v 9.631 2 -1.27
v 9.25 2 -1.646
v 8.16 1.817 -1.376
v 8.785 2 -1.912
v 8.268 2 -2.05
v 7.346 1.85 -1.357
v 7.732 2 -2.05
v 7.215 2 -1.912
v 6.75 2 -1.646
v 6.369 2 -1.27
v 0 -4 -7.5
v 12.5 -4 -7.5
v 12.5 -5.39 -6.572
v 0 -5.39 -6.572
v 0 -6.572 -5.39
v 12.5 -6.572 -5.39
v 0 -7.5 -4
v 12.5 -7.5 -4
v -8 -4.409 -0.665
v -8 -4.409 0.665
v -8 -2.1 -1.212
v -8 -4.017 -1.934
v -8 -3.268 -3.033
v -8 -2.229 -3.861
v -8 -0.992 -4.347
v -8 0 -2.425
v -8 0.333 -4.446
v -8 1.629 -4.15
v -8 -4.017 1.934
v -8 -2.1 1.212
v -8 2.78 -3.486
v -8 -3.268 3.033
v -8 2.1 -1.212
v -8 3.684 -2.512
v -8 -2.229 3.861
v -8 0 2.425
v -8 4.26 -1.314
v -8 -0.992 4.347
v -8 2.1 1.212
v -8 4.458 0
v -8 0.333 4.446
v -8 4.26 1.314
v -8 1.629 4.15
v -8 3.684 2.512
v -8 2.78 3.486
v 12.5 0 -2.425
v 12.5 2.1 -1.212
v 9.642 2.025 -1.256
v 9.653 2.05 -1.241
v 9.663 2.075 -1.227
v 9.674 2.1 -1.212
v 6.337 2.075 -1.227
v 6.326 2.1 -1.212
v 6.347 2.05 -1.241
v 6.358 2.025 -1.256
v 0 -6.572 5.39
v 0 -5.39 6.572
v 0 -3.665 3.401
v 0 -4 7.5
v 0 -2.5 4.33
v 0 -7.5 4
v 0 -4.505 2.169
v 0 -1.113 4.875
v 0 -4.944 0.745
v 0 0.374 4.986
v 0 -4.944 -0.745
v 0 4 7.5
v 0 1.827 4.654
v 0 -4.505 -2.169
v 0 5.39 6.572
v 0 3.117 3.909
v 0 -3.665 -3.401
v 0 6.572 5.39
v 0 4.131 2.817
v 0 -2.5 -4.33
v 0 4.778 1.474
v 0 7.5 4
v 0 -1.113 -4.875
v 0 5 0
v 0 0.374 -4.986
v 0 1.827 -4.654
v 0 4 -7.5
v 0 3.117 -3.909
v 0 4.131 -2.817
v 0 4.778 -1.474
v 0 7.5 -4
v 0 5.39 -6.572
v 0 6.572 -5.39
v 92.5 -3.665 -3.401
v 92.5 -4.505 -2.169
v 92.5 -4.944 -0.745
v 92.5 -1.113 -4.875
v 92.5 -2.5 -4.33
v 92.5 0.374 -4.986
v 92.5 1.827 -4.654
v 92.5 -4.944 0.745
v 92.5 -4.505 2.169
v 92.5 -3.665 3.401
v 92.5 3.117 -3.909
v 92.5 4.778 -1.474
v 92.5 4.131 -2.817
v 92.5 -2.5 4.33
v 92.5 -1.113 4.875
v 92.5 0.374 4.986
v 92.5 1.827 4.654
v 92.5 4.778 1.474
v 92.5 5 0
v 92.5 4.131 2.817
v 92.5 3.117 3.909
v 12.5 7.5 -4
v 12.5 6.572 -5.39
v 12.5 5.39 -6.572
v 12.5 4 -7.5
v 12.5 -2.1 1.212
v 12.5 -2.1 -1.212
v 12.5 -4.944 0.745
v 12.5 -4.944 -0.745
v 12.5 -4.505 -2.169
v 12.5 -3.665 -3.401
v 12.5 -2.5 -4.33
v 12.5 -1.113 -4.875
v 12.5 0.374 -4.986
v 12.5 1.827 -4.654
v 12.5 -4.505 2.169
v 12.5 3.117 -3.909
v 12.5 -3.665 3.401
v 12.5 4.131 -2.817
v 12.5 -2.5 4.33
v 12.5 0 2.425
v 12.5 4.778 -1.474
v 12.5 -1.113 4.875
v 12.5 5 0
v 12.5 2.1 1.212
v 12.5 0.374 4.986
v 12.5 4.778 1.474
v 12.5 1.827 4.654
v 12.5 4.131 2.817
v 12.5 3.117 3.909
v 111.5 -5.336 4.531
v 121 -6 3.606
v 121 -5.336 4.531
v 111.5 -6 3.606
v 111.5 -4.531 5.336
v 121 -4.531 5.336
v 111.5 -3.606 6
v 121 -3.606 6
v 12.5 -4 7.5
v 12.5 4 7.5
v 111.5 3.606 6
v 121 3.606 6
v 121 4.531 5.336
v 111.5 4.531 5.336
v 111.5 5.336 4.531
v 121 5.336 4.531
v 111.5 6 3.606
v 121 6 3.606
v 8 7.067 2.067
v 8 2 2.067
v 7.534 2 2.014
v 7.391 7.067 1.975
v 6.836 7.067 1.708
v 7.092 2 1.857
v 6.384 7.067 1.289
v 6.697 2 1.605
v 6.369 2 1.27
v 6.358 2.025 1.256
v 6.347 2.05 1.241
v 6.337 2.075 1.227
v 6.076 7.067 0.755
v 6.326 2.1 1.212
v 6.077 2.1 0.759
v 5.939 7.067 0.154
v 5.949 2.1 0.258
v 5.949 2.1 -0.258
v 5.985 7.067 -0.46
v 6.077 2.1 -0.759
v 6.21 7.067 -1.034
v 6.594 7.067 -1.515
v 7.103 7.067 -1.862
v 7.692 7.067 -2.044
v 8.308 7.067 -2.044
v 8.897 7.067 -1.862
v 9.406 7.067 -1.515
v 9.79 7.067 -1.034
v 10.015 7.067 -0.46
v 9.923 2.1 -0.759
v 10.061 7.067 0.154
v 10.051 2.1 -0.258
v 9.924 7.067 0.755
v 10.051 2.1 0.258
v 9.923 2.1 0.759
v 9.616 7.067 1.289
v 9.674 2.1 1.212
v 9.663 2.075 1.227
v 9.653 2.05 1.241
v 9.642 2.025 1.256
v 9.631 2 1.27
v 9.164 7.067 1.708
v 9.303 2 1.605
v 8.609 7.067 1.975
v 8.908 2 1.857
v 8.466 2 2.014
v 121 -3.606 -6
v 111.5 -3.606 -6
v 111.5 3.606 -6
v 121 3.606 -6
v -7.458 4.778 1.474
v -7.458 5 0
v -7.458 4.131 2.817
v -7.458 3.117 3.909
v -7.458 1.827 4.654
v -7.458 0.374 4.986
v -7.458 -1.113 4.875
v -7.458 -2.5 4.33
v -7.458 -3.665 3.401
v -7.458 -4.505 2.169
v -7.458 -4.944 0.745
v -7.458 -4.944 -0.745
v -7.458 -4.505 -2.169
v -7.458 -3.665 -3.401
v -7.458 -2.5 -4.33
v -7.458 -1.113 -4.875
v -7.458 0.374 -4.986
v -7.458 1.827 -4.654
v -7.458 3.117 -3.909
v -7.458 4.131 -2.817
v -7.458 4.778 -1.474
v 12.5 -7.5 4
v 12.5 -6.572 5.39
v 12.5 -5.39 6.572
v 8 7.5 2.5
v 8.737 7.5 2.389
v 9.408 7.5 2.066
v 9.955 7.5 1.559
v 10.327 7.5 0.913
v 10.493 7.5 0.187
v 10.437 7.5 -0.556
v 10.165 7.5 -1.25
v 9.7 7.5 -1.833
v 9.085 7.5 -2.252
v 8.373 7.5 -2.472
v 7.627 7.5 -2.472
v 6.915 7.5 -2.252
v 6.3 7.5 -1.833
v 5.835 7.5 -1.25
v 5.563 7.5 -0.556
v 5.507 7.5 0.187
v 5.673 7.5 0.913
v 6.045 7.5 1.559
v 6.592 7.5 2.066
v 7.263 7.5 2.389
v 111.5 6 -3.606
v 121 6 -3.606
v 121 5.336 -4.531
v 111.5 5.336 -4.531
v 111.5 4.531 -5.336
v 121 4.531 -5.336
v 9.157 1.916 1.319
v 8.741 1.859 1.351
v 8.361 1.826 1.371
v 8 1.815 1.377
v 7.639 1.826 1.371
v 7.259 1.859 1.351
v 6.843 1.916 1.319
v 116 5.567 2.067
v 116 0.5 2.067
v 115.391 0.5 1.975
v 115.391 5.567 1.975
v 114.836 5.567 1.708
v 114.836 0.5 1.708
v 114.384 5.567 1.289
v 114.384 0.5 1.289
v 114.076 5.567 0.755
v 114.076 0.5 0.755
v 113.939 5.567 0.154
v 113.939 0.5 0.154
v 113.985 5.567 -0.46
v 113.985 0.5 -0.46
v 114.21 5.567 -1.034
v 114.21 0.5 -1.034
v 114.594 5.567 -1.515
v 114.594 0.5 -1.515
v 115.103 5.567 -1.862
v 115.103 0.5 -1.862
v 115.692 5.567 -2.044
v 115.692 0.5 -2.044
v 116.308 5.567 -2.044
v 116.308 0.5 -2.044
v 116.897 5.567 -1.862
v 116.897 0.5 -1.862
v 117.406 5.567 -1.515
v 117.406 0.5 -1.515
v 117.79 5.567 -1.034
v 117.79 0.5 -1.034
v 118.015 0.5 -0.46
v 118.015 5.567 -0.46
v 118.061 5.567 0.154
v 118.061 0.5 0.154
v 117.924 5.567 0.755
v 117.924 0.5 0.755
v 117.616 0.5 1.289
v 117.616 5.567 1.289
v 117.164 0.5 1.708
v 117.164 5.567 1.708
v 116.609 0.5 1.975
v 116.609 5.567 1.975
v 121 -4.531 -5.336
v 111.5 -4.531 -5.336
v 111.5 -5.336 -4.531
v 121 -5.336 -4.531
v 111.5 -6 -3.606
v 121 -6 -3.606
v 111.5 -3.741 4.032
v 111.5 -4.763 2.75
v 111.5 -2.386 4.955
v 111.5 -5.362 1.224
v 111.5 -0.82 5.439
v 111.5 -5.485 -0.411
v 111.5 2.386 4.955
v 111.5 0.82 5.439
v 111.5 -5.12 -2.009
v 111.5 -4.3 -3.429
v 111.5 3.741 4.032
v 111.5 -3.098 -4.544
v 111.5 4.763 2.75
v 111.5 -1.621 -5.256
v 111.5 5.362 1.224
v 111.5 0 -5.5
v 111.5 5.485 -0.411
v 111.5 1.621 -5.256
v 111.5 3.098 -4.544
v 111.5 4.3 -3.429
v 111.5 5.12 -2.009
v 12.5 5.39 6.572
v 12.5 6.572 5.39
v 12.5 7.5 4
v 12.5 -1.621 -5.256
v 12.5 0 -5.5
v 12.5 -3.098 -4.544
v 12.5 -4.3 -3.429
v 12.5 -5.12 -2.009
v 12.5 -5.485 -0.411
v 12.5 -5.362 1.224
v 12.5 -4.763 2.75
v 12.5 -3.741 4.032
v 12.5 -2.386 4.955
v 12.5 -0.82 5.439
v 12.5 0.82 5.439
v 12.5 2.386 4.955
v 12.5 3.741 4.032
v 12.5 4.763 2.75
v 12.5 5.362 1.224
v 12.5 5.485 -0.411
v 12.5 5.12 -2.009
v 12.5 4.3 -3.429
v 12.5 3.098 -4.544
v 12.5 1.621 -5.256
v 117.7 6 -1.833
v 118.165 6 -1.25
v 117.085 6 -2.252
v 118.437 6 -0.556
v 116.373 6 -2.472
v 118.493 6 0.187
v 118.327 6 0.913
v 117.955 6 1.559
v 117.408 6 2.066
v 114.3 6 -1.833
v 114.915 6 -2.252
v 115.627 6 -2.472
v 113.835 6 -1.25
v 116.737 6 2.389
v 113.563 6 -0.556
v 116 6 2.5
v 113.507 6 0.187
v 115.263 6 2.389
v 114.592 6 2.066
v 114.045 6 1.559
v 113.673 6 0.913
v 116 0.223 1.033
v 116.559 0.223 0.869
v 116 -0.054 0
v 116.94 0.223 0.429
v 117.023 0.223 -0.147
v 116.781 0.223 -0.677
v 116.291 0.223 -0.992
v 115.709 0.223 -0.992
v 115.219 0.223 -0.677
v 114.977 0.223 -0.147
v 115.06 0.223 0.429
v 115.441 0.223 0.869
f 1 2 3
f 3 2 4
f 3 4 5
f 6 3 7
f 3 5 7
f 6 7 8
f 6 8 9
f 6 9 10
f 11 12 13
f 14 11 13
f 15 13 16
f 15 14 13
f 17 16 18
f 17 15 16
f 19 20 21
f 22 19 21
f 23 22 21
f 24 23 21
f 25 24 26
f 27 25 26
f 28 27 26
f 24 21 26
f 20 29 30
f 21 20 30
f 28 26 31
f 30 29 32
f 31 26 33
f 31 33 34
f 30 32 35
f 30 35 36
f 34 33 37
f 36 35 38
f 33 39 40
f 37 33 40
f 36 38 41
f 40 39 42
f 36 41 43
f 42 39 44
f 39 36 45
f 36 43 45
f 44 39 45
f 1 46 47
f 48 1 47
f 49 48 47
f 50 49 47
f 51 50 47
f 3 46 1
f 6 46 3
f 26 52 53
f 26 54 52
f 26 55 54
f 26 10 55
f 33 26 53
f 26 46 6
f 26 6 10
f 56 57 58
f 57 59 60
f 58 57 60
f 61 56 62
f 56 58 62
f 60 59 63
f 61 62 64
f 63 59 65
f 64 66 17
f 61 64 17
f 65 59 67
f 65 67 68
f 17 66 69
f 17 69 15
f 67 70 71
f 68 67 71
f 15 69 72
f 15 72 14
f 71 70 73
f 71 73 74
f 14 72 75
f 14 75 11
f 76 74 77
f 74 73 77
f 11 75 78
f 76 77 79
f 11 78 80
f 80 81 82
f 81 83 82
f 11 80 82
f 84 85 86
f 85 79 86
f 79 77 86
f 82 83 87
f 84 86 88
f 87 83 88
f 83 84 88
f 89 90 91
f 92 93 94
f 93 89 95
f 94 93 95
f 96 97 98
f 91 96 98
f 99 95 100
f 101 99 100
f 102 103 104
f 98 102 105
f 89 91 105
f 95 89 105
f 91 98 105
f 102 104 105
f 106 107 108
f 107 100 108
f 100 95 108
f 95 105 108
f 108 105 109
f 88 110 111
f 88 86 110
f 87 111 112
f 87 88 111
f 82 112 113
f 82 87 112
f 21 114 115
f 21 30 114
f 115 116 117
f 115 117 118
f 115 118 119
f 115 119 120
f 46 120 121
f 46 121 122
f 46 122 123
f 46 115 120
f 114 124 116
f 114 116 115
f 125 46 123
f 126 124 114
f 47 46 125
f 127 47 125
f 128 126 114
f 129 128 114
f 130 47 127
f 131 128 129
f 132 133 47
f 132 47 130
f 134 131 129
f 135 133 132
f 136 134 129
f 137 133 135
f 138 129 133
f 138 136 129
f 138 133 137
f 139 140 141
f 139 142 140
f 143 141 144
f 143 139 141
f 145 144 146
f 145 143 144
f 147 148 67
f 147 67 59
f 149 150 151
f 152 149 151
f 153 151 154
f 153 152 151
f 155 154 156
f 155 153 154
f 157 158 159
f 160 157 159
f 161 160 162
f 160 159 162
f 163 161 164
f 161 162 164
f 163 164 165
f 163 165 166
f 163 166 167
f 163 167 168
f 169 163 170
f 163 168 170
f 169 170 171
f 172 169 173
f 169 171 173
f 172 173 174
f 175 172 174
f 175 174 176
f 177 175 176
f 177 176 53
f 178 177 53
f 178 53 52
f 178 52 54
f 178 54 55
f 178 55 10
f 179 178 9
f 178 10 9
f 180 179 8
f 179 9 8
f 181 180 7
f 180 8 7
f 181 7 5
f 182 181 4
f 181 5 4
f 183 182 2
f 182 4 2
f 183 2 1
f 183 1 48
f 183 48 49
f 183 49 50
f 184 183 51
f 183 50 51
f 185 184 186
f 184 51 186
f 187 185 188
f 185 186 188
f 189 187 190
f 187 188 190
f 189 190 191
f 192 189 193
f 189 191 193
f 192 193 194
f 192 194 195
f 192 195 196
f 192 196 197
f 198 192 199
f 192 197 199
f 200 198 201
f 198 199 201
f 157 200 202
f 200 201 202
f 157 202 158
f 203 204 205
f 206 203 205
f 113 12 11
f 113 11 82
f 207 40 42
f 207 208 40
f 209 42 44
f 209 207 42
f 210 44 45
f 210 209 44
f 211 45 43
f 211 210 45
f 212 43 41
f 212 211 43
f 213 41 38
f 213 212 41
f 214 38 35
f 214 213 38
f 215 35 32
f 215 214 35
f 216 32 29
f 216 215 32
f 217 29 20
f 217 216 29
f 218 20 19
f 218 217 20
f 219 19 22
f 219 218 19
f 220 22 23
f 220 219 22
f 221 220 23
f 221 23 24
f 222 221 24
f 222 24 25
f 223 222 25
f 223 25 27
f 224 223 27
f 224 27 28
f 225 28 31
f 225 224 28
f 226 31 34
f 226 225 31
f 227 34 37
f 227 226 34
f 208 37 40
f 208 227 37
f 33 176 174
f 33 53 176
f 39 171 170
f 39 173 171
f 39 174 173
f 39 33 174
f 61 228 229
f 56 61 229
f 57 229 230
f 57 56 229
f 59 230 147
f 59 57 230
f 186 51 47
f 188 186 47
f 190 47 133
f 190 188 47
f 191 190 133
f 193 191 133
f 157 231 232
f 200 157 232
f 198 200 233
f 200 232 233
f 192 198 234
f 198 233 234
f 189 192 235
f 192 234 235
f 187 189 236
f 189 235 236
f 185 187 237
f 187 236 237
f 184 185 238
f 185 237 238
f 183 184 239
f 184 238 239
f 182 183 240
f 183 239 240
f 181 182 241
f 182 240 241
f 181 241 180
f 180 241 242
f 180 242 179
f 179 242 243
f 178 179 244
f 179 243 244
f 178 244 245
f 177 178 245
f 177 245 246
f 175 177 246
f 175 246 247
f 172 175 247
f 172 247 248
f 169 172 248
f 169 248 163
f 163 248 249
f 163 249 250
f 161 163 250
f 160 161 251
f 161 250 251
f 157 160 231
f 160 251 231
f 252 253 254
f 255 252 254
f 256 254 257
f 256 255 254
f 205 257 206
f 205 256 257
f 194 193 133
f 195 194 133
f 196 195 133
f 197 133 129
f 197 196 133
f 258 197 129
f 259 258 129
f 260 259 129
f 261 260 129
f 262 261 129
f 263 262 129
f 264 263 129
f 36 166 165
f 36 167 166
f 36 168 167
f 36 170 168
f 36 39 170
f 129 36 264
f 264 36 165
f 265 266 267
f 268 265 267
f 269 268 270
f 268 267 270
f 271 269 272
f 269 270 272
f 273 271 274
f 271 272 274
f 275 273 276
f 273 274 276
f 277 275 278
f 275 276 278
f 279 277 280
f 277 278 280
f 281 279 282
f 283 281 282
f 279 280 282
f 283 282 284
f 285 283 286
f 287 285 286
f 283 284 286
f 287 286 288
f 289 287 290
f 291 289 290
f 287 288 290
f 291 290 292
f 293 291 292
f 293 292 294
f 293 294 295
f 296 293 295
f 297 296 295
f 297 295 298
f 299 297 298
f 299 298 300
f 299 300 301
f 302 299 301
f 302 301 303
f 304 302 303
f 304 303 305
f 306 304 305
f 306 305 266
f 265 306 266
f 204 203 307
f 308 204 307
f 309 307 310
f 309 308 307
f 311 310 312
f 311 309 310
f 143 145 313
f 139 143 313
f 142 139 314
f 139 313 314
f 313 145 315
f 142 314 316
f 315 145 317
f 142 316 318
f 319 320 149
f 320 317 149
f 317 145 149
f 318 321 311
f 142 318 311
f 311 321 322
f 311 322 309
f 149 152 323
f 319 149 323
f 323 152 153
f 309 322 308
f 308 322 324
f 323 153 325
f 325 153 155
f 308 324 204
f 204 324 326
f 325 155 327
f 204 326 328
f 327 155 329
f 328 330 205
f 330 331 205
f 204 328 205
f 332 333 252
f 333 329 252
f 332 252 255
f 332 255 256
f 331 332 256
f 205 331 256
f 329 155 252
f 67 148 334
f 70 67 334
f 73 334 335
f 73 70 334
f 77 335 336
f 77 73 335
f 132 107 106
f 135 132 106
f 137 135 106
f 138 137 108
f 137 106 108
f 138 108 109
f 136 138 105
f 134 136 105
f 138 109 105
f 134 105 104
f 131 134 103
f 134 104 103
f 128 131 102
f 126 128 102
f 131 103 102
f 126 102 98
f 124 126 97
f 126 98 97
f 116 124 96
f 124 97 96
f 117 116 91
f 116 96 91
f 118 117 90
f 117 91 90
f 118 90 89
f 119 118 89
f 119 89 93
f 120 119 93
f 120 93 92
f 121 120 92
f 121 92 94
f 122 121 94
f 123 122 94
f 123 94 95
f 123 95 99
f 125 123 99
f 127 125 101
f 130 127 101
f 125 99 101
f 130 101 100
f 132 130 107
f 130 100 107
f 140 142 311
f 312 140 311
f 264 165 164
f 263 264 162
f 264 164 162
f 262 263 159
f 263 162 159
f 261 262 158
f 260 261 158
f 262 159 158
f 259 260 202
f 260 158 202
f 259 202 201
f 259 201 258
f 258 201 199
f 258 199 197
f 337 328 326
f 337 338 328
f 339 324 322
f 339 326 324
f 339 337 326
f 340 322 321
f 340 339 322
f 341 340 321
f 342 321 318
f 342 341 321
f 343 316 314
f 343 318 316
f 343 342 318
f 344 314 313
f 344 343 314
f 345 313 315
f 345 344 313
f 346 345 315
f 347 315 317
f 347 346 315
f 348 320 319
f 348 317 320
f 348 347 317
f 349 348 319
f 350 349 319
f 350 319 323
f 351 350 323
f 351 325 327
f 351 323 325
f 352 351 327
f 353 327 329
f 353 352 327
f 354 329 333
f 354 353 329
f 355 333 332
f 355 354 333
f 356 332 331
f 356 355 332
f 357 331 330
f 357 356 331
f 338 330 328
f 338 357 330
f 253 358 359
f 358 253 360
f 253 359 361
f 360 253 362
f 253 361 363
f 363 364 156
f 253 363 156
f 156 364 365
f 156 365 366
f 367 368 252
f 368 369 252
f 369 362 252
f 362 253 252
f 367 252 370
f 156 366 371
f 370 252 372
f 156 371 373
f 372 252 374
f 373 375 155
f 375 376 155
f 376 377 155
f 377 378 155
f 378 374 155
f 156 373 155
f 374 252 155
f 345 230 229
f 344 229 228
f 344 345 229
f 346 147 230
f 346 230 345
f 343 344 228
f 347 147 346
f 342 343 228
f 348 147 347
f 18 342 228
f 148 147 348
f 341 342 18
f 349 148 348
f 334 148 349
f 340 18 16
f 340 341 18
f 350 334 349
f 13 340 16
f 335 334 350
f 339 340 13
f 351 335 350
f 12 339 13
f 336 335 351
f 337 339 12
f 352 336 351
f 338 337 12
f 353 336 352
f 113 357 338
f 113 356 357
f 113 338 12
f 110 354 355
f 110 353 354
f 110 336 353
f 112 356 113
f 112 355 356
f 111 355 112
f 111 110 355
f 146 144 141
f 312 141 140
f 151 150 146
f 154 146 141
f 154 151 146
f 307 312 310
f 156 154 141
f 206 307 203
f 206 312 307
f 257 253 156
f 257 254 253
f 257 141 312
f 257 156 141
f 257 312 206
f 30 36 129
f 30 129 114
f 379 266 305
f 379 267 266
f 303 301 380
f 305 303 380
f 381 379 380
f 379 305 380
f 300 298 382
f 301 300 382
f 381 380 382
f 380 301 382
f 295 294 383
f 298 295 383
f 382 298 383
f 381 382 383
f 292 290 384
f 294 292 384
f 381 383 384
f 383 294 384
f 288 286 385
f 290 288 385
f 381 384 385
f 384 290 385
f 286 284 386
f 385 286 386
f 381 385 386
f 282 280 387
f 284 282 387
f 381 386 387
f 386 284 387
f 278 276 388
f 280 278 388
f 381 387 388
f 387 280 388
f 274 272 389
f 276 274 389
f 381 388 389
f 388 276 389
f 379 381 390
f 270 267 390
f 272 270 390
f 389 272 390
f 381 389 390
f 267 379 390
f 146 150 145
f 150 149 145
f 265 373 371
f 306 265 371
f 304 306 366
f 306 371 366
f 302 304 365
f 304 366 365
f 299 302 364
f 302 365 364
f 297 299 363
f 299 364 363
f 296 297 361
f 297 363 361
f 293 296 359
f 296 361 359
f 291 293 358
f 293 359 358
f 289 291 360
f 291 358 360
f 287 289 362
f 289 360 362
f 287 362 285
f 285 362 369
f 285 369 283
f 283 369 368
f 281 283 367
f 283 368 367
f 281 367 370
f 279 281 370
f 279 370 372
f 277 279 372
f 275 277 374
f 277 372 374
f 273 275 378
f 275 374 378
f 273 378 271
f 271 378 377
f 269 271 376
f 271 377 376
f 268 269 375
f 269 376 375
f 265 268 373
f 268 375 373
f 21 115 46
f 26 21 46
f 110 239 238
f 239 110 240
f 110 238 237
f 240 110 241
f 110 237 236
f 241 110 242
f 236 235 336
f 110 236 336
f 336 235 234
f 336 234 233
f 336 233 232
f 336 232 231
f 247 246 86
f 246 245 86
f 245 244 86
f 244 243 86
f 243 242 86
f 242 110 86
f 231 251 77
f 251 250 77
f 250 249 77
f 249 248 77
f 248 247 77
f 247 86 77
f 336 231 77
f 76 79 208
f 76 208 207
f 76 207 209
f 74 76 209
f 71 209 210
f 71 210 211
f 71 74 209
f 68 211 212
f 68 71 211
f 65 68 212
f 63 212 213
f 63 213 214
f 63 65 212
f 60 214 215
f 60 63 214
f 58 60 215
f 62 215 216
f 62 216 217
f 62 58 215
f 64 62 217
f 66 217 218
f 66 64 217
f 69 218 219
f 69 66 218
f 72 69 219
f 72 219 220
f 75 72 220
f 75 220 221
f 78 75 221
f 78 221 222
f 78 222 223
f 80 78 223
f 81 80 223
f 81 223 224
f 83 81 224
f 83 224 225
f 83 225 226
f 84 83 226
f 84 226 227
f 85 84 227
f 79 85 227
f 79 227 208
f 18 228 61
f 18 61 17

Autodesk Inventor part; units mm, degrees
sketch "Sketch_8" plane through (0, 0, 0) normal (0, 0, 1) x (1, 0, 0)
  line L0 (0, 0) -> (-8, 0)
  line L1 (-8, 0) -> (-8, 4.4585)
  line L2 (-8, 4.4585) -> (-7.4585, 5)
  line L3 (-7.4585, 5) -> (0, 5)
  line L4 (0, 5) -> (0, 0)
  line L5 (0, 0) -> (-8, 0)
revolve "Revolution1" add sketch "Sketch_8" angle 360 about axis through (0, 0, 0) along (1, 0, 0)
thread "Thread1" size "M10x1" class "6g" standard "ISO Metric profile" length 5.9585
sketch "Sketch_9" plane through (0, 0, 0) normal (1, 0, 0) x (0, 0, -1)
  line L0 (-7.5, 4) -> (-7.5, -4)
  arc A0 (-7.5, -4) -> (-4, -7.5) centre (0, 0) ccw
  line L1 (-4, -7.5) -> (4, -7.5)
  arc A1 (4, -7.5) -> (7.5, -4) centre (0, 0) ccw
  line L2 (7.5, -4) -> (7.5, 4)
  arc A2 (7.5, 4) -> (4, 7.5) centre (0, 0) ccw
  line L3 (4, 7.5) -> (-4, 7.5)
  arc A3 (-4, 7.5) -> (-7.5, 4) centre (0, 0) ccw
extrude "Extrusion1" add sketch "Sketch_9" along normal blind 12.5
sketch "Sketch_6" plane through (12.5, 0, 0) normal (1, 0, 0) x (0, 0, -1)
  circle A0 centre (0, 0) radius 5.5
extrude "Extrusion2" add sketch "Sketch_6" along normal blind 99
sketch "Sketch_10" plane through (111.5, 0, 0) normal (1, 0, 0) x (0, 0, -1)
  line L0 (-6, 3.6056) -> (-6, -3.6056)
  arc A0 (-6, -3.6056) -> (-3.6056, -6) centre (0, 0) ccw
  line L1 (-3.6056, -6) -> (3.6056, -6)
  arc A1 (3.6056, -6) -> (6, -3.6056) centre (0, 0) ccw
  line L2 (6, -3.6056) -> (6, 3.6056)
  arc A2 (6, 3.6056) -> (3.6056, 6) centre (0, 0) ccw
  line L3 (3.6056, 6) -> (-3.6056, 6)
  arc A3 (-3.6056, 6) -> (-6, 3.6056) centre (0, 0) ccw
extrude "Extrusion3" add sketch "Sketch_10" along normal blind 9.5
sketch "Sketch5" plane through (0, 7.5, 4) normal (0, 1, 0) x (1, 0, 0)
  point P0 (8, 4)
hole "Hole1" at (8, 7.5, 0) direction (0, -1, 0) diameter 4.134 depth 5.5 tip angle 150 countersink diameter 5 countersink angle 90 thread size "M5x0.8" class "6H" standard "ISO Metric profile"
sketch "Sketch6" plane through (111.5, 6, 3.6056) normal (0, 1, 0) x (1, 0, 0)
  point P0 (4.5, 3.6056)
hole "Hole2" at (116, 6, 0) direction (0, -1, 0) diameter 4.134 depth 5.5 tip angle 150 countersink diameter 5 countersink angle 90 thread size "M5x0.8" class "6H" standard "ISO Metric profile"
sketch "Sketch_26" plane through (-8, 0, 0) normal (1, 0, 0) x (0, 0, -1)
  line L0 (-2.4249, 0) -> (-1.2124, -2.1)
  line L1 (-1.2124, -2.1) -> (1.2124, -2.1)
  line L2 (1.2124, -2.1) -> (2.4249, 0)
  line L3 (2.4249, 0) -> (1.2124, 2.1)
  line L4 (1.2124, 2.1) -> (-1.2124, 2.1)
  line L5 (-1.2124, 2.1) -> (-2.4249, 0)
extrude "Extrusion4" cut sketch "Sketch_26" along normal blind 20.5
sketch "Sketch_16" plane through (0, 0, 0) normal (0, 0, 1) x (1, 0, 0)
  line L0 (92.5, 0) -> (12.5, 0)
  line L1 (12.5, 0) -> (12.5, 5)
  line L2 (12.5, 5) -> (92.5, 5)
  line L3 (92.5, 5) -> (92.5, 0)
  line L4 (92.5, 0) -> (12.5, 0)
revolve "Revolution2" cut sketch "Sketch_16" angle 360 about axis through (92.5, 0, 0) along (1, 0, 0)
ref_plane "BODY_N_XY" through (121, 0, 0) normal (0, 0, 1) x (1, 0, 0)
ref_plane "BODY_N_YZ" through (121, 0, 0) normal (1, 0, 0) x (0, 1, 0)
ref_plane "BODY_N_ZX" through (121, 0, 0) normal (0, 1, 0) x (0, 0, 1)
ref_plane "BSW1_XY" through (17, 0, 0) normal (1, 0, 0) x (0, 0, -1)
ref_plane "BSW1_YZ" through (17, 0, 0) normal (0, 0, -1) x (0, 1, 0)
ref_plane "BSW1_ZX" through (17, 0, 0) normal (0, 1, 0) x (1, 0, 0)
ref_plane "BSW2_XY" through (107, 0, 0) normal (-1, 0, 0) x (0, 0, -1)
ref_plane "BSW2_YZ" through (107, 0, 0) normal (0, 0, -1) x (0, -1, 0)
ref_plane "BSW2_ZX" through (107, 0, 0) normal (0, -1, 0) x (-1, 0, 0)
ref_plane "RSW1_XY" through (17, -11, 0) normal (1, 0, 0) x (0, 0, -1)
ref_plane "RSW1_YZ" through (17, -11, 0) normal (0, 0, -1) x (0, 1, 0)
ref_plane "RSW1_ZX" through (17, -11, 0) normal (0, 1, 0) x (1, 0, 0)
ref_plane "RSW2_XY" through (107, -11, 0) normal (-1, 0, 0) x (0, 0, -1)
ref_plane "RSW2_YZ" through (107, -11, 0) normal (0, 0, -1) x (0, -1, 0)
ref_plane "RSW2_ZX" through (107, -11, 0) normal (0, -1, 0) x (-1, 0, 0)
ref_plane "body_XY" through (0, 0, 0) normal (1, 0, 0) x (0, 0, -1)
ref_plane "body_YZ" through (0, 0, 0) normal (0, 0, -1) x (0, 1, 0)
ref_plane "body_ZX" through (0, 0, 0) normal (0, 1, 0) x (1, 0, 0)
ref_plane "body2_XY" through (121, 0, 0) normal (-1, 0, 0) x (0, 0, -1)
ref_plane "body2_YZ" through (121, 0, 0) normal (0, 0, -1) x (0, -1, 0)
ref_plane "body2_ZX" through (121, 0, 0) normal (0, -1, 0) x (-1, 0, 0)
ref_plane "rod_XY" through (-28, 0, 0) normal (-1, 0, 0) x (0, 0, -1)
ref_plane "rod_YZ" through (-28, 0, 0) normal (0, 0, -1) x (0, -1, 0)
ref_plane "rod_ZX" through (-28, 0, 0) normal (0, -1, 0) x (-1, 0, 0)
properties part number "CJ2KB10-75Z(0)_BODY" material "ステンレス鋼"
